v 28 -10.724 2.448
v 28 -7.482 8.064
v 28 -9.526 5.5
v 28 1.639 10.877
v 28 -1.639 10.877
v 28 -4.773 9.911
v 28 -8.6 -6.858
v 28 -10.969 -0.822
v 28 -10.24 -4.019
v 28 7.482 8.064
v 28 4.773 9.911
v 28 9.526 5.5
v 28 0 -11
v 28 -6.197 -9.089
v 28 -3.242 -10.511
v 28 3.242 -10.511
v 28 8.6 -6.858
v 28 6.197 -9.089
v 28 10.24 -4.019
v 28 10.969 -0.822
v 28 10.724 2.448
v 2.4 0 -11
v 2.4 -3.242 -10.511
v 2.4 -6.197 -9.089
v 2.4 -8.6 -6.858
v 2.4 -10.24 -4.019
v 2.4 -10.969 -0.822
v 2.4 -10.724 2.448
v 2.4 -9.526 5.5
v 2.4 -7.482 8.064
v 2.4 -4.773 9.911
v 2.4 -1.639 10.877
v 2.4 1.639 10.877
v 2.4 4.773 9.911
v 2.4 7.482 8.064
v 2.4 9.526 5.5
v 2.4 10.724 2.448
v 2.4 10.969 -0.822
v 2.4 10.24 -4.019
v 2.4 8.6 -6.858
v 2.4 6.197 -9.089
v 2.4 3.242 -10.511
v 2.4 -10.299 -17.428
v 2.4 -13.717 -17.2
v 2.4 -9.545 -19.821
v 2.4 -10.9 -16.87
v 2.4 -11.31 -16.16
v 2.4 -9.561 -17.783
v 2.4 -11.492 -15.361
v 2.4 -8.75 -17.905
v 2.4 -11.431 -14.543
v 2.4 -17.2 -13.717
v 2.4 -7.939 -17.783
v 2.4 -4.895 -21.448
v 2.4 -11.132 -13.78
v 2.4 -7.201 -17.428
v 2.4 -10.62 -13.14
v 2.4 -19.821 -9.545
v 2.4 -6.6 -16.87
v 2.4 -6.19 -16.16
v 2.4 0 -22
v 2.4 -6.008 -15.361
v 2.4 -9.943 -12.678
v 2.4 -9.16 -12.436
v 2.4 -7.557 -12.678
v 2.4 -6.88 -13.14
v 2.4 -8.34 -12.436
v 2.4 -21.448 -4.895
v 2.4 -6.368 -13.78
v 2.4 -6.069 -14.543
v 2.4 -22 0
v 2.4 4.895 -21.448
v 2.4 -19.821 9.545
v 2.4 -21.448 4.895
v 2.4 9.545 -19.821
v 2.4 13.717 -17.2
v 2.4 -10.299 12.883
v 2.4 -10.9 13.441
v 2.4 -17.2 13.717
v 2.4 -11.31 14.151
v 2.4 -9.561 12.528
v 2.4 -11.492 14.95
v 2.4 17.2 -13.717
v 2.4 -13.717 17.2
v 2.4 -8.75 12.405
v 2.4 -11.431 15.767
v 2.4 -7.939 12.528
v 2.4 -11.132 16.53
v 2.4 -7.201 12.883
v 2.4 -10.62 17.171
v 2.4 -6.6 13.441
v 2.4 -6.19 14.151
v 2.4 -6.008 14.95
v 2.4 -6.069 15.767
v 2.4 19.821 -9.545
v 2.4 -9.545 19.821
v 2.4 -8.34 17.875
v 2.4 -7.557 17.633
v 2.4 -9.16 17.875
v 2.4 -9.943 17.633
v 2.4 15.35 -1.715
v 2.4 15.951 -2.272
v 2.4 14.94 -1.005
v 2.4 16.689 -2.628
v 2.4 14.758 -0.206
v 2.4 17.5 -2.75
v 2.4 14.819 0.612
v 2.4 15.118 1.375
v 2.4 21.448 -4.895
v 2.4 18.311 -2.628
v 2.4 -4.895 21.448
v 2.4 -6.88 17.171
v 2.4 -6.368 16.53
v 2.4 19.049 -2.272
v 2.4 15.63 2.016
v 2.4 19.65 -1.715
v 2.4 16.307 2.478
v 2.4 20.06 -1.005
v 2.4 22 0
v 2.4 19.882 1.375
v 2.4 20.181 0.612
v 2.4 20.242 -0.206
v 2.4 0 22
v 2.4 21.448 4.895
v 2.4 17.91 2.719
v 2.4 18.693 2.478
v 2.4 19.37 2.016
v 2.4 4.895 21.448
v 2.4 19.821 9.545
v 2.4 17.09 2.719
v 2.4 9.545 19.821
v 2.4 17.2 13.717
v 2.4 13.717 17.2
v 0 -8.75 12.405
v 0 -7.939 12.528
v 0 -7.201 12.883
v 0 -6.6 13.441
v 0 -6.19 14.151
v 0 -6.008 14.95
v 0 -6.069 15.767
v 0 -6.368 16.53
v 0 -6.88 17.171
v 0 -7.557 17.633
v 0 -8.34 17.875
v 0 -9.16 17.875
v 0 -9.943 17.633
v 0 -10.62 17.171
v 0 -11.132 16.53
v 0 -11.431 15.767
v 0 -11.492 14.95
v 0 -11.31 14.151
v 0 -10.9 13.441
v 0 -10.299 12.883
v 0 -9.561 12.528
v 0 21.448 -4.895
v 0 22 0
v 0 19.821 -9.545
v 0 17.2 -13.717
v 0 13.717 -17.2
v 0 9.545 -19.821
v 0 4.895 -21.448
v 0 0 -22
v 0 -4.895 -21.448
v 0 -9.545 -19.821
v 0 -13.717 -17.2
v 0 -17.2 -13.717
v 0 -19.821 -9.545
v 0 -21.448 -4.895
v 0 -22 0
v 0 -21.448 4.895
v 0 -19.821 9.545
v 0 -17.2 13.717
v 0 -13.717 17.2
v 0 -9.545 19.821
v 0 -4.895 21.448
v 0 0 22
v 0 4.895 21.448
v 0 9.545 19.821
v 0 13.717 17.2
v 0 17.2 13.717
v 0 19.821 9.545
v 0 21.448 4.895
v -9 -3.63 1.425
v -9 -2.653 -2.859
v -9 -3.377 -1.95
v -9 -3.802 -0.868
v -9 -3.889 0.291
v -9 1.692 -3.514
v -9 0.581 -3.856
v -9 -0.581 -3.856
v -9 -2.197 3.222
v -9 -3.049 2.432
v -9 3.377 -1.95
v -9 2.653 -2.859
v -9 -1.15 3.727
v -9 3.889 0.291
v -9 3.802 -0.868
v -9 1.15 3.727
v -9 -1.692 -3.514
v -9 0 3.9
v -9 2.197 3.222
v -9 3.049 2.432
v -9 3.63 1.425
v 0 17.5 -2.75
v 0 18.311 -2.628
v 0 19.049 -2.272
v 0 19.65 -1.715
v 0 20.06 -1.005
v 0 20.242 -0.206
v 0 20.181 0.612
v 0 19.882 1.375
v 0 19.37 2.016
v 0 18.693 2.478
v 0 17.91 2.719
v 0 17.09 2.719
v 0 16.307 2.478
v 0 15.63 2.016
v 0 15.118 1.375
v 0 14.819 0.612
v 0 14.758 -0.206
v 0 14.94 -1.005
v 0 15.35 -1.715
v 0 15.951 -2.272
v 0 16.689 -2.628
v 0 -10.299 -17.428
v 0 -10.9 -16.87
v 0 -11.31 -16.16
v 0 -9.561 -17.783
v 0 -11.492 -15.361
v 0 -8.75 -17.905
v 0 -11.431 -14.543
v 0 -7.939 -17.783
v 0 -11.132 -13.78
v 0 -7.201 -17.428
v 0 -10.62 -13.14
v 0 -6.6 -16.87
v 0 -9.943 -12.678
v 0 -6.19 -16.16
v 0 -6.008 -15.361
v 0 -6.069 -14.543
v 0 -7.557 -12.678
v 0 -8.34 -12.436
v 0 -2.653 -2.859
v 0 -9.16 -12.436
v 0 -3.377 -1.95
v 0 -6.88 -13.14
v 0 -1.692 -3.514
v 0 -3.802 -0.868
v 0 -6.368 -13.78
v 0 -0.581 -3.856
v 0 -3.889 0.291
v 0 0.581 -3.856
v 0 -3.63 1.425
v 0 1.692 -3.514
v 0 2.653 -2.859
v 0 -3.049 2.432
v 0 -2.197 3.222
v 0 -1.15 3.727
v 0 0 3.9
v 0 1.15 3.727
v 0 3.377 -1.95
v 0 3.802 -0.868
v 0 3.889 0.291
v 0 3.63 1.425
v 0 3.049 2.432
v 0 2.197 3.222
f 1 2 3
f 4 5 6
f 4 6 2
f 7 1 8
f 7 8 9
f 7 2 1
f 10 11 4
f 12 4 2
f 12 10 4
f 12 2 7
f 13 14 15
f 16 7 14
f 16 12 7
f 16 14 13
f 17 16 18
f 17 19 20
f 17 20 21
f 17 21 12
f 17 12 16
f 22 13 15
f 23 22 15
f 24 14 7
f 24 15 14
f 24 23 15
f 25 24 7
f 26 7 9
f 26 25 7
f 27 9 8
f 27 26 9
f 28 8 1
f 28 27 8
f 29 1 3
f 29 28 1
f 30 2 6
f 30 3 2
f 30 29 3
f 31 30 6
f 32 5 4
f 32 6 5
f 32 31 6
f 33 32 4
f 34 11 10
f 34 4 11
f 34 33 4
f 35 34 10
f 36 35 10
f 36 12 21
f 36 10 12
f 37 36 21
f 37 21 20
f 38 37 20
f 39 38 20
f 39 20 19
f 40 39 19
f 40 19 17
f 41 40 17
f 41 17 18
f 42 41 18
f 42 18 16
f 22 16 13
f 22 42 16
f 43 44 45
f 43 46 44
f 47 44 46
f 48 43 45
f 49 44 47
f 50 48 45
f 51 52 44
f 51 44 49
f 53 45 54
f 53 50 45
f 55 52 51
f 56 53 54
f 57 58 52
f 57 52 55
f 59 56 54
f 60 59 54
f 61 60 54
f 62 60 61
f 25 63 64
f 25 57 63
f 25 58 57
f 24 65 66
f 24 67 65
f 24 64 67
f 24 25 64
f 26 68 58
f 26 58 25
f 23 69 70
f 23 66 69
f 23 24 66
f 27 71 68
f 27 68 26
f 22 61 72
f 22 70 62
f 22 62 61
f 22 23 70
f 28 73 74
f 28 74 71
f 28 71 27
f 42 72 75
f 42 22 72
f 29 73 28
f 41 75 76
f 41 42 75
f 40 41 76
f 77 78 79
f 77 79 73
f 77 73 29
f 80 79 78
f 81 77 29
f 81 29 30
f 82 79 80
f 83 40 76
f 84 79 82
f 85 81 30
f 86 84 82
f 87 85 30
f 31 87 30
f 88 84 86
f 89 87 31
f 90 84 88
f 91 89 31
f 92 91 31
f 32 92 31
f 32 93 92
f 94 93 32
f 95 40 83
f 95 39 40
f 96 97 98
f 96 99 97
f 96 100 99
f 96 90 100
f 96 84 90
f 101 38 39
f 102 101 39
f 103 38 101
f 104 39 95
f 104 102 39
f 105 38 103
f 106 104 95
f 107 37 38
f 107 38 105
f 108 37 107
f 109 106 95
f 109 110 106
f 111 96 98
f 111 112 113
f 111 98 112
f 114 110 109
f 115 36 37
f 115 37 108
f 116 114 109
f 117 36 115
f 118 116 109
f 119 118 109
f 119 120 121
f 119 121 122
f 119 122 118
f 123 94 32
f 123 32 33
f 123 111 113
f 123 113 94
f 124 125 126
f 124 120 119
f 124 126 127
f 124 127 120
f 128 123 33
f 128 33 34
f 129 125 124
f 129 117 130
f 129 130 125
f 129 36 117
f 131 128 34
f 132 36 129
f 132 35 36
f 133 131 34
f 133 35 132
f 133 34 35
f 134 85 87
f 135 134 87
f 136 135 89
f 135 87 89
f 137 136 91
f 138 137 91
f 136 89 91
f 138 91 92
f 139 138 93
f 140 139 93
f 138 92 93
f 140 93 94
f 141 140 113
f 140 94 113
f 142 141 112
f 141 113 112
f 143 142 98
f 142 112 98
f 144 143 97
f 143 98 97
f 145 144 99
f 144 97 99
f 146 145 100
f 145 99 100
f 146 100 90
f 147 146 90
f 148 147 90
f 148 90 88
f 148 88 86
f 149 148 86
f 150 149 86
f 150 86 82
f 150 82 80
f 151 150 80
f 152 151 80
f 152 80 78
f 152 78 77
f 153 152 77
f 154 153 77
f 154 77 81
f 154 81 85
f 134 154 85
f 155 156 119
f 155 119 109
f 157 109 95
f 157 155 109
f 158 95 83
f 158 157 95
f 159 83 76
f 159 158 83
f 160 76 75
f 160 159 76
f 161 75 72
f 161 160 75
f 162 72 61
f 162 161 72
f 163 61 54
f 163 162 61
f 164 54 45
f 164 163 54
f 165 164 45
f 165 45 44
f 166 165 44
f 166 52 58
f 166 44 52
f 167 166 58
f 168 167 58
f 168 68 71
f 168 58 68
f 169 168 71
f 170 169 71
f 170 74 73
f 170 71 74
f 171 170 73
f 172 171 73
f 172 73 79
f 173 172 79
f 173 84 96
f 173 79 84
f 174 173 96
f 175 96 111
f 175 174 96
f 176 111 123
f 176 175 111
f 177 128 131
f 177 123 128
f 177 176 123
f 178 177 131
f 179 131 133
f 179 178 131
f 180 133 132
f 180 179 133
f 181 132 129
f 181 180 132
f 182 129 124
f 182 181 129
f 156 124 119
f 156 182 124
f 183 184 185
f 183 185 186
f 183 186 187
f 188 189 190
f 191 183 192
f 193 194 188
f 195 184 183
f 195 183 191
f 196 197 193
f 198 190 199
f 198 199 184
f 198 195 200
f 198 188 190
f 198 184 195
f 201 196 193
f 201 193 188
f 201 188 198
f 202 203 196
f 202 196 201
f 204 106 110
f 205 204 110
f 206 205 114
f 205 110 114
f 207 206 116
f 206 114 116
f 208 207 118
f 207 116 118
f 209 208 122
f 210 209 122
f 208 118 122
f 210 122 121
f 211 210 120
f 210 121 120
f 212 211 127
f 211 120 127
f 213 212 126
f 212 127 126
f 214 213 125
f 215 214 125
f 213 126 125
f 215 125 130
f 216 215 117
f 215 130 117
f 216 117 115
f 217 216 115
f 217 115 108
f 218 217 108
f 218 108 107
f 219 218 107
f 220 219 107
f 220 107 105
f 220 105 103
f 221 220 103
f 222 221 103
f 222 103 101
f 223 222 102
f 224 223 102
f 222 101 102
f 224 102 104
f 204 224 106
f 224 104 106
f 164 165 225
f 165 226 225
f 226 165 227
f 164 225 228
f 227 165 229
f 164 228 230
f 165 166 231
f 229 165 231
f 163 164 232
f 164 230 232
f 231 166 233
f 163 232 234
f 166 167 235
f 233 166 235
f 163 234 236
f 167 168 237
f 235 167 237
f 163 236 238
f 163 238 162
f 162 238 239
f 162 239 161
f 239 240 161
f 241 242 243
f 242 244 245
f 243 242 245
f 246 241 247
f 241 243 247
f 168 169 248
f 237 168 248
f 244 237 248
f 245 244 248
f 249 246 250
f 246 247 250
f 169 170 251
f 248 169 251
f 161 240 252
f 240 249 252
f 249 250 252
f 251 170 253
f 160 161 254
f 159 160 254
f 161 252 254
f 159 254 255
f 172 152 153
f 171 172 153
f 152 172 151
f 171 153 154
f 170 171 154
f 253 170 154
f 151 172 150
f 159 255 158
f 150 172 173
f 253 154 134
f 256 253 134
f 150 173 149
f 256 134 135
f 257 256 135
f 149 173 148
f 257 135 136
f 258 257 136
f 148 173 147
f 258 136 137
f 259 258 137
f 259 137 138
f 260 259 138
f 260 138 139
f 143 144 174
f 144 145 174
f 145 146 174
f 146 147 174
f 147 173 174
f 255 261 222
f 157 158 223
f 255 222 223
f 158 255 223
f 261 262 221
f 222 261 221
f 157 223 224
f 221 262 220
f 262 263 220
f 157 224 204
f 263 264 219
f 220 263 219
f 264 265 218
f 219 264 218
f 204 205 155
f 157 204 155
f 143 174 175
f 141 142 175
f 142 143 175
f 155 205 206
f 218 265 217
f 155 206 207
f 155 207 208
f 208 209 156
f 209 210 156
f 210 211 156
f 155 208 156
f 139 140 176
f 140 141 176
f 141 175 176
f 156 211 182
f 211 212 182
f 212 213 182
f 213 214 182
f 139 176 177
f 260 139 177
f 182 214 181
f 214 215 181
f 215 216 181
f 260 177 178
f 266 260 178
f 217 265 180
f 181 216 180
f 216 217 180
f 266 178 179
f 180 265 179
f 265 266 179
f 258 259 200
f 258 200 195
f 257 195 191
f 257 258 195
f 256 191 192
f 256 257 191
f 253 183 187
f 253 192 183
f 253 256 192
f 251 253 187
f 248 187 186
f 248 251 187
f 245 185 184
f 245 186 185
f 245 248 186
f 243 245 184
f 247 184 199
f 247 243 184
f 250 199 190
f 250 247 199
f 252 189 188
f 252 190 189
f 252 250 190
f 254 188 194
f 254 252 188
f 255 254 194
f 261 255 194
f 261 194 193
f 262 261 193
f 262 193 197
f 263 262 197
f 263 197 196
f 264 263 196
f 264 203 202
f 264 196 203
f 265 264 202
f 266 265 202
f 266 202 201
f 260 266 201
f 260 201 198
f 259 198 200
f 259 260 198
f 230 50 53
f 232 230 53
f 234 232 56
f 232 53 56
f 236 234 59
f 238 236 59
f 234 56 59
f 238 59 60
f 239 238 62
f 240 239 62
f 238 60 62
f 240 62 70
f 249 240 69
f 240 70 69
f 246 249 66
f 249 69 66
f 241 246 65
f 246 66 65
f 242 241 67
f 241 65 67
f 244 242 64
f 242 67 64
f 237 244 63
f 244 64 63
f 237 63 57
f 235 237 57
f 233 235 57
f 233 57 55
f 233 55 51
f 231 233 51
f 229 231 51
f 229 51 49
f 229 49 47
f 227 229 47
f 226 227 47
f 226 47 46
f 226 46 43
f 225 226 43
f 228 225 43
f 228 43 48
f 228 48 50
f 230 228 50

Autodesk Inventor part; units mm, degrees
ref_plane "YZ Plane" through (0, 0, 0) normal (1, 0, 0) x (0, 1, 0)
ref_plane "XZ Plane" through (0, 0, 0) normal (0, 1, 0) x (-1, 0, 0)
ref_plane "XY Plane" through (0, 0, 0) normal (0, 0, 1) x (1, 0, 0)
sketch "Sketch1" plane through (0, 0, 0) normal (1, 0, 0) x (0, 1, 0)
  circle A0 centre (0, 0) radius 22
  dimension "d0" = 44
extrude "Extrusion1" add sketch "Sketch1" along normal blind 2.4
sketch "Sketch2" plane through (2.4, 0, 0) normal (1, 0, 0) x (0, 0, -1)
  line L0 (0, 0) -> (0, 17.5)
  circle A0 centre (0, 17.5) radius 2.75
  circle A1 centre (-15.1554, -8.75) radius 2.75
  circle A2 centre (15.1554, -8.75) radius 2.75
  dimension "d3" = 17.5
  dimension "d4" = 5.5
  dimension "d7" = 360
extrude "Extrusion2" cut sketch "Sketch2" against normal blind 2.4
sketch "Sketch3" plane through (2.4, 0, 0) normal (1, 0, 0) x (0, 0, -1)
  circle A0 centre (0, 0) radius 11
  dimension "d11" = 22
extrude "Extrusion3" add sketch "Sketch3" along normal blind 25.6
sketch "Sketch4" plane through (0, 0, 0) normal (-1, 0, 0) x (0, 0, 1)
  circle A0 centre (0, 0) radius 11 projected
  circle A1 centre (0, 0) radius 3.9
  dimension "d14" = 7.8
extrude "Extrusion4" add sketch "Sketch4" along normal blind 9 contours A1
properties part number "SlipRing-022A-12"
